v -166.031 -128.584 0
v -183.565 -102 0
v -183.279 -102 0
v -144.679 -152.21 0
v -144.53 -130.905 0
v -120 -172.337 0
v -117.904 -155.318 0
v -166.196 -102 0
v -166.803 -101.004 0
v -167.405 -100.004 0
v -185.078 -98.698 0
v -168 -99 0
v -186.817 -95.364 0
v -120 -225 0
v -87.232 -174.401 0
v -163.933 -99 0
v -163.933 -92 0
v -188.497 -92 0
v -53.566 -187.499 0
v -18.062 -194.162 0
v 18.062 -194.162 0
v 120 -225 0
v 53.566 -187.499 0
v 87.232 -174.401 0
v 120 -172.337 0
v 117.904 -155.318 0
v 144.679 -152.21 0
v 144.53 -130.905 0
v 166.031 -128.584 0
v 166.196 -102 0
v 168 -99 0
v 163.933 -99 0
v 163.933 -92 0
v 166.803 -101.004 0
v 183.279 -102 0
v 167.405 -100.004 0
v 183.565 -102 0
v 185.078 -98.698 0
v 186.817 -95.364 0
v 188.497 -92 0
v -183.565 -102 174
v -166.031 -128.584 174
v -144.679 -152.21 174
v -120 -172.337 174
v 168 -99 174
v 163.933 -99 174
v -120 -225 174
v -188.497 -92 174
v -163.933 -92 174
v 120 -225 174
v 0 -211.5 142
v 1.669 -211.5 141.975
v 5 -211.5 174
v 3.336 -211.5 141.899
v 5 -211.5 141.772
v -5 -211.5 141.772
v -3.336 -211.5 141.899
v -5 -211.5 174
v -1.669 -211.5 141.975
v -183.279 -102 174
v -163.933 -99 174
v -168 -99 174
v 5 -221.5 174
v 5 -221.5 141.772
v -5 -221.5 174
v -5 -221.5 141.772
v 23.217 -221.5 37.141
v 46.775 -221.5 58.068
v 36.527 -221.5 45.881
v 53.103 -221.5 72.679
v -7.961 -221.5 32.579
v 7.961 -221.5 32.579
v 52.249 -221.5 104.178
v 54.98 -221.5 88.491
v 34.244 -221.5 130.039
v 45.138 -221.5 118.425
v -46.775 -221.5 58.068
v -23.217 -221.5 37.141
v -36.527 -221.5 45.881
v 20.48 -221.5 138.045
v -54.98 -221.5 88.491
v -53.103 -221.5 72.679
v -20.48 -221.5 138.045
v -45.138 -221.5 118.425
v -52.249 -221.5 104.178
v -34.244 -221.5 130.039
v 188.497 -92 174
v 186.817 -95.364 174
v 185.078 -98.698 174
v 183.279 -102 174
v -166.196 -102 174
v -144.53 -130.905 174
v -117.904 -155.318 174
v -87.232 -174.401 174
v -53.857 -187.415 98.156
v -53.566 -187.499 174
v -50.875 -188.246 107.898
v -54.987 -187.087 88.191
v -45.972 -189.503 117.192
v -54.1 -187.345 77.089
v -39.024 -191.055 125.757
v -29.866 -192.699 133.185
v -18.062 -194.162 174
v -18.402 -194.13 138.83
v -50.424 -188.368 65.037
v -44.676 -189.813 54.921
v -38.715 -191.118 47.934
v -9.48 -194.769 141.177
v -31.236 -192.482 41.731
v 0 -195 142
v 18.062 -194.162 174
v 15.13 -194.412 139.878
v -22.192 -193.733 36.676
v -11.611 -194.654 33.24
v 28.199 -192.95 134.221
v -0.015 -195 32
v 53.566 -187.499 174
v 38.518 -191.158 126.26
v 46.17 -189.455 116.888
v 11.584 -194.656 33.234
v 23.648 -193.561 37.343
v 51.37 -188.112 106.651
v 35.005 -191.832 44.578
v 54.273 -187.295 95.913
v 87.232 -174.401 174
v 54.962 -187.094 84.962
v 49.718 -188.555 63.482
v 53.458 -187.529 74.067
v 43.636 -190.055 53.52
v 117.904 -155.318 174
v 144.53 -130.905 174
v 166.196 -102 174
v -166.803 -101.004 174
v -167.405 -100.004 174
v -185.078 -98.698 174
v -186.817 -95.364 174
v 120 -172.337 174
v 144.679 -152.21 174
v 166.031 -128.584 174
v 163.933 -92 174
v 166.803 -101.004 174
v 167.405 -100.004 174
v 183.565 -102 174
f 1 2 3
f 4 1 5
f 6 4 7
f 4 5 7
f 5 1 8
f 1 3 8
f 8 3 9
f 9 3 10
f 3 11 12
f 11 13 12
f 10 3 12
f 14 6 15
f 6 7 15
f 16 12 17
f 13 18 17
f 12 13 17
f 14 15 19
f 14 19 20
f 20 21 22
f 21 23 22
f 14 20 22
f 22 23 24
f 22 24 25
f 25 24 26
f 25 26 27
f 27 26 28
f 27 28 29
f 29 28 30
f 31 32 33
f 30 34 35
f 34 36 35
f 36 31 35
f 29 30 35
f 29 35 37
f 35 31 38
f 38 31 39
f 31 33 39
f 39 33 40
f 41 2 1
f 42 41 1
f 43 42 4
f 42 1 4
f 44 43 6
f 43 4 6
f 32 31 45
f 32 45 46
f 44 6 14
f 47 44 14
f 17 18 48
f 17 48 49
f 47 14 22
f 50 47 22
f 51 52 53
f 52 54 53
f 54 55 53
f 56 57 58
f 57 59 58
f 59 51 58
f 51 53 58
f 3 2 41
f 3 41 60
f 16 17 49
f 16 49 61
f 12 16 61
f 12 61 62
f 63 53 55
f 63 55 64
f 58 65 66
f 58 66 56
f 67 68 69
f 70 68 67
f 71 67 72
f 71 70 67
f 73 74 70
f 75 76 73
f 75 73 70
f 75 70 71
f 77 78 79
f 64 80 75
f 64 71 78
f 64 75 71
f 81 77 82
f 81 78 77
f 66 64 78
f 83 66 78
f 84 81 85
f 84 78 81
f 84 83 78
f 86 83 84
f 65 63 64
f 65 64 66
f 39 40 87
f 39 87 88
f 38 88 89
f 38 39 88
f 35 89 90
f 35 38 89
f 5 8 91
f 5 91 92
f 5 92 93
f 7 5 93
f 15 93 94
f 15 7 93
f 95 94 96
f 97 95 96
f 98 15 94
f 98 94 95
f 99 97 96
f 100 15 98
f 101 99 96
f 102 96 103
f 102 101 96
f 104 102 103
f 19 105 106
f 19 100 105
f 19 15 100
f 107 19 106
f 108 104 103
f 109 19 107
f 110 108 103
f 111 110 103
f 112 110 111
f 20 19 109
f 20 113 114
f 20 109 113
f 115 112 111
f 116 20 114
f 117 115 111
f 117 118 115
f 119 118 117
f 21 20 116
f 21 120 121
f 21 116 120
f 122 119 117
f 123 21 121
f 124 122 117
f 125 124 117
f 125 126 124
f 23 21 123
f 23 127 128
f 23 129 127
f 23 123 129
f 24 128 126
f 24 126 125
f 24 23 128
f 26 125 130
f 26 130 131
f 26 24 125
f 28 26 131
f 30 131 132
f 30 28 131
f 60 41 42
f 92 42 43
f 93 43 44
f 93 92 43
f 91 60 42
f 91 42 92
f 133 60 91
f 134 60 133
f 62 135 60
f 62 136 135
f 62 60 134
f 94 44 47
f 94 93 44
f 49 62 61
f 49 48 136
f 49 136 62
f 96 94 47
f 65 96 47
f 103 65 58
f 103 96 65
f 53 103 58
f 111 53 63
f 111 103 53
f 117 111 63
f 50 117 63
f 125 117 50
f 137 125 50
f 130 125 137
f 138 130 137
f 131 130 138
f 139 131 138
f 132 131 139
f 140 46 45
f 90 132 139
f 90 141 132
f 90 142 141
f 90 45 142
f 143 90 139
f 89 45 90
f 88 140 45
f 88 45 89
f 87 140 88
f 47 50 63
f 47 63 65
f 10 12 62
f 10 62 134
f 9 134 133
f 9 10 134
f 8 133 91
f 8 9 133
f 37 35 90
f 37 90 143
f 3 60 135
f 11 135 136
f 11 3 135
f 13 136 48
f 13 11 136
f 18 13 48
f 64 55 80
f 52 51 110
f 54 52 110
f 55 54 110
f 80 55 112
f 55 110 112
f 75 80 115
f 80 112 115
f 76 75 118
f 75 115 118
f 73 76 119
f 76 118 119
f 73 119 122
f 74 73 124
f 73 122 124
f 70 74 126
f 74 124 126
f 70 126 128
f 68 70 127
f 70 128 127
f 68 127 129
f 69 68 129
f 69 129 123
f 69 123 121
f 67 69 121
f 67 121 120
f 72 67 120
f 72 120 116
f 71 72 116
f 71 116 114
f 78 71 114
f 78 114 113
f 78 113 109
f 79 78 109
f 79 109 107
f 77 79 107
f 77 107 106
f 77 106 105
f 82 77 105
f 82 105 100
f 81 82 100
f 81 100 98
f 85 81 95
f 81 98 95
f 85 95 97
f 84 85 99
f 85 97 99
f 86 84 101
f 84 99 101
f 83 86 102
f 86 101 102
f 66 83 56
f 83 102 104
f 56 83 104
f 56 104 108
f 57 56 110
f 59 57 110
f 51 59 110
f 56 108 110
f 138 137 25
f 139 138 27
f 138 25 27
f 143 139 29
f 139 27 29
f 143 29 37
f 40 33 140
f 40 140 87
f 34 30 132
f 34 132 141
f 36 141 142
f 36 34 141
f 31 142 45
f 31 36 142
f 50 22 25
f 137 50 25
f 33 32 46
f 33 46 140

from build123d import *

# Parameters (mm, degrees)
SKETCH_1_R          = 210
SKETCH_1_R_2        = 203
EXTRUDE_2_DEPTH     = 174
EXTRUDE_START       = -174
EXTRUDE_4_DEPTH     = 174
CUT_EXTRUDE_1_DEPTH = 654
EXTRUDE_5_DEPTH     = 174
EXTRUDE_6_DEPTH     = 174
EXTRUDE_7_DEPTH     = 174
EXTRUDE_8_DEPTH     = 174
EXTRUDE_9_DEPTH     = 174
SKETCH_11_R         = 55
CUT_EXTRUDE_4_DEPTH = 221.5
CUT_EXTRUDE_5_DEPTH = 87


with BuildPart() as part:
    # 草图1 → 凸台-拉伸2 (new body)
    with BuildSketch(Plane.XY):
        Circle(SKETCH_1_R)
        Circle(SKETCH_1_R_2, mode=Mode.SUBTRACT)
    extrude(amount=EXTRUDE_2_DEPTH)

    # 草图2 → 凸台-拉伸4 (add)
    with BuildSketch(Plane.XY.offset(174).offset(EXTRUDE_START)):
        with BuildLine():
            Line((-170.735431044, -102), (-173.735431044, -102))
            Line((-173.735431044, -102), (-175.513532242, -102))
            ThreePointArc((-175.513532242, -102), (-174.63092392, -103.50381834), (-173.735431044, -105))
            Line((-173.735431044, -105), (-170.735431044, -105))
            Line((-170.735431044, -105), (-170.735431044, -102))
        make_face()
        with BuildLine():
            ThreePointArc((173.735431044, -105), (174.63092392, -103.50381834), (175.513532242, -102))
            Line((175.513532242, -102), (173.735431044, -102))
            Line((173.735431044, -102), (170.735431044, -102))
            Line((170.735431044, -102), (170.735431044, -105))
            Line((170.735431044, -105), (173.735431044, -105))
        make_face()
    extrude(amount=EXTRUDE_4_DEPTH)

    # 草图3 → 切除-拉伸1 (cut)
    with BuildSketch(Plane.XY.offset(174)):
        Polygon((-170.735431044, -102), (238.333646515, -102), (254.334169784, 272.292523591), (-334.569415043, 221.85110305), (-306.830562533, -102), align=None)
    extrude(amount=-CUT_EXTRUDE_1_DEPTH, mode=Mode.SUBTRACT)

    # 草图5 → 凸台-拉伸5 (add)
    with BuildSketch(Plane.XY.offset(174).offset(EXTRUDE_START)):
        with BuildLine():
            Line((-120, -209.75), (-10.243900624, -209.75))
            ThreePointArc((-10.243900624, -209.75), (-67.755470707, -198.769203322), (-120, -172.336879396))
            Line((-120, -172.336879396), (-120, -209.75))
        make_face()
        with BuildLine():
            ThreePointArc((120, -172.336879396), (67.755470707, -198.769203322), (10.243900624, -209.75))
            Line((10.243900624, -209.75), (120, -209.75))
            Line((120, -209.75), (120, -172.336879396))
        make_face()
    extrude(amount=EXTRUDE_5_DEPTH)

    # 草图6 → 凸台-拉伸6 (add)
    with BuildSketch(Plane.XY.offset(174).offset(EXTRUDE_START)):
        with BuildLine():
            Line((-175.513532242, -102), (-166.195667814, -102))
            ThreePointArc((-166.195667814, -102), (0, -195), (166.195667814, -102))
            Line((166.195667814, -102), (175.513532242, -102))
            ThreePointArc((175.513532242, -102), (0, -203), (-175.513532242, -102))
        make_face()
    extrude(amount=EXTRUDE_6_DEPTH)

    # 草图7 → 凸台-拉伸7 (add)
    with BuildSketch(Plane.XY.offset(174).offset(EXTRUDE_START)):
        with BuildLine():
            Line((-166.933126535, -92), (-166.933126535, -95))
            Line((-166.933126535, -95), (-170.293863659, -95))
            ThreePointArc((-170.293863659, -95), (0, -195), (170.293863659, -95))
            Line((170.293863659, -95), (166.933126535, -95))
            Line((166.933126535, -95), (166.933126535, -92))
            Line((166.933126535, -92), (171.933126535, -92))
            Line((171.933126535, -92), (188.496850106, -92))
            ThreePointArc((188.496850106, -92), (0, -209.75), (-188.496850106, -92))
            Line((-188.496850106, -92), (-171.933126535, -92))
            Line((-171.933126535, -92), (-166.933126535, -92))
        make_face()
    extrude(amount=EXTRUDE_7_DEPTH)

    # 草图8 → 凸台-拉伸8 (add)
    with BuildSketch(Plane(origin=(0, 0, 0), x_dir=(-1, 0, 0), z_dir=(0, 0, -1))):
        with BuildLine():
            Line((166.933126535, -92), (163.933126535, -92))
            Line((163.933126535, -92), (163.933126535, -99))
            Line((163.933126535, -99), (168, -99))
            ThreePointArc((168, -99), (169.158755456, -97.006780447), (170.293863659, -95))
            Line((170.293863659, -95), (166.933126535, -95))
            Line((166.933126535, -95), (166.933126535, -92))
        make_face()
        with BuildLine():
            Line((-166.933126535, -95), (-170.293863659, -95))
            ThreePointArc((-170.293863659, -95), (-169.158755456, -97.006780447), (-168, -99))
            Line((-168, -99), (-163.933126535, -99))
            Line((-163.933126535, -99), (-163.933126535, -92))
            Line((-163.933126535, -92), (-166.933126535, -92))
            Line((-166.933126535, -92), (-166.933126535, -95))
        make_face()
    extrude(amount=-EXTRUDE_8_DEPTH)

    # 草图9 → 凸台-拉伸9 (add)
    with BuildSketch(Plane.XY.offset(174).offset(EXTRUDE_START)):
        with BuildLine():
            ThreePointArc((10.243900624, -209.75), (5.123475383, -209.937490697), (0, -210))
            Line((0, -210), (0, -225))
            Line((0, -225), (18.007375678, -225))
            Line((18.007375678, -225), (120, -225))
            Line((120, -225), (120, -209.75))
            Line((120, -209.75), (10.243900624, -209.75))
        make_face()
        with BuildLine():
            Line((0, -225), (0, -210))
            ThreePointArc((0, -210), (-5.123475383, -209.937490697), (-10.243900624, -209.75))
            Line((-10.243900624, -209.75), (-120, -209.75))
            Line((-120, -209.75), (-120, -225))
            Line((-120, -225), (0, -225))
        make_face()
    extrude(amount=EXTRUDE_9_DEPTH)

    # 草图11 → 切除-拉伸4 (cut)
    with BuildSketch(Plane(origin=(0, 0, 0), x_dir=(1, 0, 0), z_dir=(0, 1, 0))):
        with Locations(Location((0, -87, 0), (0, 0, 270))):
            Circle(SKETCH_11_R)
    extrude(amount=-CUT_EXTRUDE_4_DEPTH, mode=Mode.SUBTRACT)

    # 草图10 → 切除-拉伸5 (cut)
    with BuildSketch(Plane.XY.offset(174)):
        Polygon((5, -221.5), (-5, -221.5), (-5, -211.5), (0, -211.5), (5, -211.5), align=None)
    extrude(amount=-CUT_EXTRUDE_5_DEPTH, mode=Mode.SUBTRACT)


solid = part.part
